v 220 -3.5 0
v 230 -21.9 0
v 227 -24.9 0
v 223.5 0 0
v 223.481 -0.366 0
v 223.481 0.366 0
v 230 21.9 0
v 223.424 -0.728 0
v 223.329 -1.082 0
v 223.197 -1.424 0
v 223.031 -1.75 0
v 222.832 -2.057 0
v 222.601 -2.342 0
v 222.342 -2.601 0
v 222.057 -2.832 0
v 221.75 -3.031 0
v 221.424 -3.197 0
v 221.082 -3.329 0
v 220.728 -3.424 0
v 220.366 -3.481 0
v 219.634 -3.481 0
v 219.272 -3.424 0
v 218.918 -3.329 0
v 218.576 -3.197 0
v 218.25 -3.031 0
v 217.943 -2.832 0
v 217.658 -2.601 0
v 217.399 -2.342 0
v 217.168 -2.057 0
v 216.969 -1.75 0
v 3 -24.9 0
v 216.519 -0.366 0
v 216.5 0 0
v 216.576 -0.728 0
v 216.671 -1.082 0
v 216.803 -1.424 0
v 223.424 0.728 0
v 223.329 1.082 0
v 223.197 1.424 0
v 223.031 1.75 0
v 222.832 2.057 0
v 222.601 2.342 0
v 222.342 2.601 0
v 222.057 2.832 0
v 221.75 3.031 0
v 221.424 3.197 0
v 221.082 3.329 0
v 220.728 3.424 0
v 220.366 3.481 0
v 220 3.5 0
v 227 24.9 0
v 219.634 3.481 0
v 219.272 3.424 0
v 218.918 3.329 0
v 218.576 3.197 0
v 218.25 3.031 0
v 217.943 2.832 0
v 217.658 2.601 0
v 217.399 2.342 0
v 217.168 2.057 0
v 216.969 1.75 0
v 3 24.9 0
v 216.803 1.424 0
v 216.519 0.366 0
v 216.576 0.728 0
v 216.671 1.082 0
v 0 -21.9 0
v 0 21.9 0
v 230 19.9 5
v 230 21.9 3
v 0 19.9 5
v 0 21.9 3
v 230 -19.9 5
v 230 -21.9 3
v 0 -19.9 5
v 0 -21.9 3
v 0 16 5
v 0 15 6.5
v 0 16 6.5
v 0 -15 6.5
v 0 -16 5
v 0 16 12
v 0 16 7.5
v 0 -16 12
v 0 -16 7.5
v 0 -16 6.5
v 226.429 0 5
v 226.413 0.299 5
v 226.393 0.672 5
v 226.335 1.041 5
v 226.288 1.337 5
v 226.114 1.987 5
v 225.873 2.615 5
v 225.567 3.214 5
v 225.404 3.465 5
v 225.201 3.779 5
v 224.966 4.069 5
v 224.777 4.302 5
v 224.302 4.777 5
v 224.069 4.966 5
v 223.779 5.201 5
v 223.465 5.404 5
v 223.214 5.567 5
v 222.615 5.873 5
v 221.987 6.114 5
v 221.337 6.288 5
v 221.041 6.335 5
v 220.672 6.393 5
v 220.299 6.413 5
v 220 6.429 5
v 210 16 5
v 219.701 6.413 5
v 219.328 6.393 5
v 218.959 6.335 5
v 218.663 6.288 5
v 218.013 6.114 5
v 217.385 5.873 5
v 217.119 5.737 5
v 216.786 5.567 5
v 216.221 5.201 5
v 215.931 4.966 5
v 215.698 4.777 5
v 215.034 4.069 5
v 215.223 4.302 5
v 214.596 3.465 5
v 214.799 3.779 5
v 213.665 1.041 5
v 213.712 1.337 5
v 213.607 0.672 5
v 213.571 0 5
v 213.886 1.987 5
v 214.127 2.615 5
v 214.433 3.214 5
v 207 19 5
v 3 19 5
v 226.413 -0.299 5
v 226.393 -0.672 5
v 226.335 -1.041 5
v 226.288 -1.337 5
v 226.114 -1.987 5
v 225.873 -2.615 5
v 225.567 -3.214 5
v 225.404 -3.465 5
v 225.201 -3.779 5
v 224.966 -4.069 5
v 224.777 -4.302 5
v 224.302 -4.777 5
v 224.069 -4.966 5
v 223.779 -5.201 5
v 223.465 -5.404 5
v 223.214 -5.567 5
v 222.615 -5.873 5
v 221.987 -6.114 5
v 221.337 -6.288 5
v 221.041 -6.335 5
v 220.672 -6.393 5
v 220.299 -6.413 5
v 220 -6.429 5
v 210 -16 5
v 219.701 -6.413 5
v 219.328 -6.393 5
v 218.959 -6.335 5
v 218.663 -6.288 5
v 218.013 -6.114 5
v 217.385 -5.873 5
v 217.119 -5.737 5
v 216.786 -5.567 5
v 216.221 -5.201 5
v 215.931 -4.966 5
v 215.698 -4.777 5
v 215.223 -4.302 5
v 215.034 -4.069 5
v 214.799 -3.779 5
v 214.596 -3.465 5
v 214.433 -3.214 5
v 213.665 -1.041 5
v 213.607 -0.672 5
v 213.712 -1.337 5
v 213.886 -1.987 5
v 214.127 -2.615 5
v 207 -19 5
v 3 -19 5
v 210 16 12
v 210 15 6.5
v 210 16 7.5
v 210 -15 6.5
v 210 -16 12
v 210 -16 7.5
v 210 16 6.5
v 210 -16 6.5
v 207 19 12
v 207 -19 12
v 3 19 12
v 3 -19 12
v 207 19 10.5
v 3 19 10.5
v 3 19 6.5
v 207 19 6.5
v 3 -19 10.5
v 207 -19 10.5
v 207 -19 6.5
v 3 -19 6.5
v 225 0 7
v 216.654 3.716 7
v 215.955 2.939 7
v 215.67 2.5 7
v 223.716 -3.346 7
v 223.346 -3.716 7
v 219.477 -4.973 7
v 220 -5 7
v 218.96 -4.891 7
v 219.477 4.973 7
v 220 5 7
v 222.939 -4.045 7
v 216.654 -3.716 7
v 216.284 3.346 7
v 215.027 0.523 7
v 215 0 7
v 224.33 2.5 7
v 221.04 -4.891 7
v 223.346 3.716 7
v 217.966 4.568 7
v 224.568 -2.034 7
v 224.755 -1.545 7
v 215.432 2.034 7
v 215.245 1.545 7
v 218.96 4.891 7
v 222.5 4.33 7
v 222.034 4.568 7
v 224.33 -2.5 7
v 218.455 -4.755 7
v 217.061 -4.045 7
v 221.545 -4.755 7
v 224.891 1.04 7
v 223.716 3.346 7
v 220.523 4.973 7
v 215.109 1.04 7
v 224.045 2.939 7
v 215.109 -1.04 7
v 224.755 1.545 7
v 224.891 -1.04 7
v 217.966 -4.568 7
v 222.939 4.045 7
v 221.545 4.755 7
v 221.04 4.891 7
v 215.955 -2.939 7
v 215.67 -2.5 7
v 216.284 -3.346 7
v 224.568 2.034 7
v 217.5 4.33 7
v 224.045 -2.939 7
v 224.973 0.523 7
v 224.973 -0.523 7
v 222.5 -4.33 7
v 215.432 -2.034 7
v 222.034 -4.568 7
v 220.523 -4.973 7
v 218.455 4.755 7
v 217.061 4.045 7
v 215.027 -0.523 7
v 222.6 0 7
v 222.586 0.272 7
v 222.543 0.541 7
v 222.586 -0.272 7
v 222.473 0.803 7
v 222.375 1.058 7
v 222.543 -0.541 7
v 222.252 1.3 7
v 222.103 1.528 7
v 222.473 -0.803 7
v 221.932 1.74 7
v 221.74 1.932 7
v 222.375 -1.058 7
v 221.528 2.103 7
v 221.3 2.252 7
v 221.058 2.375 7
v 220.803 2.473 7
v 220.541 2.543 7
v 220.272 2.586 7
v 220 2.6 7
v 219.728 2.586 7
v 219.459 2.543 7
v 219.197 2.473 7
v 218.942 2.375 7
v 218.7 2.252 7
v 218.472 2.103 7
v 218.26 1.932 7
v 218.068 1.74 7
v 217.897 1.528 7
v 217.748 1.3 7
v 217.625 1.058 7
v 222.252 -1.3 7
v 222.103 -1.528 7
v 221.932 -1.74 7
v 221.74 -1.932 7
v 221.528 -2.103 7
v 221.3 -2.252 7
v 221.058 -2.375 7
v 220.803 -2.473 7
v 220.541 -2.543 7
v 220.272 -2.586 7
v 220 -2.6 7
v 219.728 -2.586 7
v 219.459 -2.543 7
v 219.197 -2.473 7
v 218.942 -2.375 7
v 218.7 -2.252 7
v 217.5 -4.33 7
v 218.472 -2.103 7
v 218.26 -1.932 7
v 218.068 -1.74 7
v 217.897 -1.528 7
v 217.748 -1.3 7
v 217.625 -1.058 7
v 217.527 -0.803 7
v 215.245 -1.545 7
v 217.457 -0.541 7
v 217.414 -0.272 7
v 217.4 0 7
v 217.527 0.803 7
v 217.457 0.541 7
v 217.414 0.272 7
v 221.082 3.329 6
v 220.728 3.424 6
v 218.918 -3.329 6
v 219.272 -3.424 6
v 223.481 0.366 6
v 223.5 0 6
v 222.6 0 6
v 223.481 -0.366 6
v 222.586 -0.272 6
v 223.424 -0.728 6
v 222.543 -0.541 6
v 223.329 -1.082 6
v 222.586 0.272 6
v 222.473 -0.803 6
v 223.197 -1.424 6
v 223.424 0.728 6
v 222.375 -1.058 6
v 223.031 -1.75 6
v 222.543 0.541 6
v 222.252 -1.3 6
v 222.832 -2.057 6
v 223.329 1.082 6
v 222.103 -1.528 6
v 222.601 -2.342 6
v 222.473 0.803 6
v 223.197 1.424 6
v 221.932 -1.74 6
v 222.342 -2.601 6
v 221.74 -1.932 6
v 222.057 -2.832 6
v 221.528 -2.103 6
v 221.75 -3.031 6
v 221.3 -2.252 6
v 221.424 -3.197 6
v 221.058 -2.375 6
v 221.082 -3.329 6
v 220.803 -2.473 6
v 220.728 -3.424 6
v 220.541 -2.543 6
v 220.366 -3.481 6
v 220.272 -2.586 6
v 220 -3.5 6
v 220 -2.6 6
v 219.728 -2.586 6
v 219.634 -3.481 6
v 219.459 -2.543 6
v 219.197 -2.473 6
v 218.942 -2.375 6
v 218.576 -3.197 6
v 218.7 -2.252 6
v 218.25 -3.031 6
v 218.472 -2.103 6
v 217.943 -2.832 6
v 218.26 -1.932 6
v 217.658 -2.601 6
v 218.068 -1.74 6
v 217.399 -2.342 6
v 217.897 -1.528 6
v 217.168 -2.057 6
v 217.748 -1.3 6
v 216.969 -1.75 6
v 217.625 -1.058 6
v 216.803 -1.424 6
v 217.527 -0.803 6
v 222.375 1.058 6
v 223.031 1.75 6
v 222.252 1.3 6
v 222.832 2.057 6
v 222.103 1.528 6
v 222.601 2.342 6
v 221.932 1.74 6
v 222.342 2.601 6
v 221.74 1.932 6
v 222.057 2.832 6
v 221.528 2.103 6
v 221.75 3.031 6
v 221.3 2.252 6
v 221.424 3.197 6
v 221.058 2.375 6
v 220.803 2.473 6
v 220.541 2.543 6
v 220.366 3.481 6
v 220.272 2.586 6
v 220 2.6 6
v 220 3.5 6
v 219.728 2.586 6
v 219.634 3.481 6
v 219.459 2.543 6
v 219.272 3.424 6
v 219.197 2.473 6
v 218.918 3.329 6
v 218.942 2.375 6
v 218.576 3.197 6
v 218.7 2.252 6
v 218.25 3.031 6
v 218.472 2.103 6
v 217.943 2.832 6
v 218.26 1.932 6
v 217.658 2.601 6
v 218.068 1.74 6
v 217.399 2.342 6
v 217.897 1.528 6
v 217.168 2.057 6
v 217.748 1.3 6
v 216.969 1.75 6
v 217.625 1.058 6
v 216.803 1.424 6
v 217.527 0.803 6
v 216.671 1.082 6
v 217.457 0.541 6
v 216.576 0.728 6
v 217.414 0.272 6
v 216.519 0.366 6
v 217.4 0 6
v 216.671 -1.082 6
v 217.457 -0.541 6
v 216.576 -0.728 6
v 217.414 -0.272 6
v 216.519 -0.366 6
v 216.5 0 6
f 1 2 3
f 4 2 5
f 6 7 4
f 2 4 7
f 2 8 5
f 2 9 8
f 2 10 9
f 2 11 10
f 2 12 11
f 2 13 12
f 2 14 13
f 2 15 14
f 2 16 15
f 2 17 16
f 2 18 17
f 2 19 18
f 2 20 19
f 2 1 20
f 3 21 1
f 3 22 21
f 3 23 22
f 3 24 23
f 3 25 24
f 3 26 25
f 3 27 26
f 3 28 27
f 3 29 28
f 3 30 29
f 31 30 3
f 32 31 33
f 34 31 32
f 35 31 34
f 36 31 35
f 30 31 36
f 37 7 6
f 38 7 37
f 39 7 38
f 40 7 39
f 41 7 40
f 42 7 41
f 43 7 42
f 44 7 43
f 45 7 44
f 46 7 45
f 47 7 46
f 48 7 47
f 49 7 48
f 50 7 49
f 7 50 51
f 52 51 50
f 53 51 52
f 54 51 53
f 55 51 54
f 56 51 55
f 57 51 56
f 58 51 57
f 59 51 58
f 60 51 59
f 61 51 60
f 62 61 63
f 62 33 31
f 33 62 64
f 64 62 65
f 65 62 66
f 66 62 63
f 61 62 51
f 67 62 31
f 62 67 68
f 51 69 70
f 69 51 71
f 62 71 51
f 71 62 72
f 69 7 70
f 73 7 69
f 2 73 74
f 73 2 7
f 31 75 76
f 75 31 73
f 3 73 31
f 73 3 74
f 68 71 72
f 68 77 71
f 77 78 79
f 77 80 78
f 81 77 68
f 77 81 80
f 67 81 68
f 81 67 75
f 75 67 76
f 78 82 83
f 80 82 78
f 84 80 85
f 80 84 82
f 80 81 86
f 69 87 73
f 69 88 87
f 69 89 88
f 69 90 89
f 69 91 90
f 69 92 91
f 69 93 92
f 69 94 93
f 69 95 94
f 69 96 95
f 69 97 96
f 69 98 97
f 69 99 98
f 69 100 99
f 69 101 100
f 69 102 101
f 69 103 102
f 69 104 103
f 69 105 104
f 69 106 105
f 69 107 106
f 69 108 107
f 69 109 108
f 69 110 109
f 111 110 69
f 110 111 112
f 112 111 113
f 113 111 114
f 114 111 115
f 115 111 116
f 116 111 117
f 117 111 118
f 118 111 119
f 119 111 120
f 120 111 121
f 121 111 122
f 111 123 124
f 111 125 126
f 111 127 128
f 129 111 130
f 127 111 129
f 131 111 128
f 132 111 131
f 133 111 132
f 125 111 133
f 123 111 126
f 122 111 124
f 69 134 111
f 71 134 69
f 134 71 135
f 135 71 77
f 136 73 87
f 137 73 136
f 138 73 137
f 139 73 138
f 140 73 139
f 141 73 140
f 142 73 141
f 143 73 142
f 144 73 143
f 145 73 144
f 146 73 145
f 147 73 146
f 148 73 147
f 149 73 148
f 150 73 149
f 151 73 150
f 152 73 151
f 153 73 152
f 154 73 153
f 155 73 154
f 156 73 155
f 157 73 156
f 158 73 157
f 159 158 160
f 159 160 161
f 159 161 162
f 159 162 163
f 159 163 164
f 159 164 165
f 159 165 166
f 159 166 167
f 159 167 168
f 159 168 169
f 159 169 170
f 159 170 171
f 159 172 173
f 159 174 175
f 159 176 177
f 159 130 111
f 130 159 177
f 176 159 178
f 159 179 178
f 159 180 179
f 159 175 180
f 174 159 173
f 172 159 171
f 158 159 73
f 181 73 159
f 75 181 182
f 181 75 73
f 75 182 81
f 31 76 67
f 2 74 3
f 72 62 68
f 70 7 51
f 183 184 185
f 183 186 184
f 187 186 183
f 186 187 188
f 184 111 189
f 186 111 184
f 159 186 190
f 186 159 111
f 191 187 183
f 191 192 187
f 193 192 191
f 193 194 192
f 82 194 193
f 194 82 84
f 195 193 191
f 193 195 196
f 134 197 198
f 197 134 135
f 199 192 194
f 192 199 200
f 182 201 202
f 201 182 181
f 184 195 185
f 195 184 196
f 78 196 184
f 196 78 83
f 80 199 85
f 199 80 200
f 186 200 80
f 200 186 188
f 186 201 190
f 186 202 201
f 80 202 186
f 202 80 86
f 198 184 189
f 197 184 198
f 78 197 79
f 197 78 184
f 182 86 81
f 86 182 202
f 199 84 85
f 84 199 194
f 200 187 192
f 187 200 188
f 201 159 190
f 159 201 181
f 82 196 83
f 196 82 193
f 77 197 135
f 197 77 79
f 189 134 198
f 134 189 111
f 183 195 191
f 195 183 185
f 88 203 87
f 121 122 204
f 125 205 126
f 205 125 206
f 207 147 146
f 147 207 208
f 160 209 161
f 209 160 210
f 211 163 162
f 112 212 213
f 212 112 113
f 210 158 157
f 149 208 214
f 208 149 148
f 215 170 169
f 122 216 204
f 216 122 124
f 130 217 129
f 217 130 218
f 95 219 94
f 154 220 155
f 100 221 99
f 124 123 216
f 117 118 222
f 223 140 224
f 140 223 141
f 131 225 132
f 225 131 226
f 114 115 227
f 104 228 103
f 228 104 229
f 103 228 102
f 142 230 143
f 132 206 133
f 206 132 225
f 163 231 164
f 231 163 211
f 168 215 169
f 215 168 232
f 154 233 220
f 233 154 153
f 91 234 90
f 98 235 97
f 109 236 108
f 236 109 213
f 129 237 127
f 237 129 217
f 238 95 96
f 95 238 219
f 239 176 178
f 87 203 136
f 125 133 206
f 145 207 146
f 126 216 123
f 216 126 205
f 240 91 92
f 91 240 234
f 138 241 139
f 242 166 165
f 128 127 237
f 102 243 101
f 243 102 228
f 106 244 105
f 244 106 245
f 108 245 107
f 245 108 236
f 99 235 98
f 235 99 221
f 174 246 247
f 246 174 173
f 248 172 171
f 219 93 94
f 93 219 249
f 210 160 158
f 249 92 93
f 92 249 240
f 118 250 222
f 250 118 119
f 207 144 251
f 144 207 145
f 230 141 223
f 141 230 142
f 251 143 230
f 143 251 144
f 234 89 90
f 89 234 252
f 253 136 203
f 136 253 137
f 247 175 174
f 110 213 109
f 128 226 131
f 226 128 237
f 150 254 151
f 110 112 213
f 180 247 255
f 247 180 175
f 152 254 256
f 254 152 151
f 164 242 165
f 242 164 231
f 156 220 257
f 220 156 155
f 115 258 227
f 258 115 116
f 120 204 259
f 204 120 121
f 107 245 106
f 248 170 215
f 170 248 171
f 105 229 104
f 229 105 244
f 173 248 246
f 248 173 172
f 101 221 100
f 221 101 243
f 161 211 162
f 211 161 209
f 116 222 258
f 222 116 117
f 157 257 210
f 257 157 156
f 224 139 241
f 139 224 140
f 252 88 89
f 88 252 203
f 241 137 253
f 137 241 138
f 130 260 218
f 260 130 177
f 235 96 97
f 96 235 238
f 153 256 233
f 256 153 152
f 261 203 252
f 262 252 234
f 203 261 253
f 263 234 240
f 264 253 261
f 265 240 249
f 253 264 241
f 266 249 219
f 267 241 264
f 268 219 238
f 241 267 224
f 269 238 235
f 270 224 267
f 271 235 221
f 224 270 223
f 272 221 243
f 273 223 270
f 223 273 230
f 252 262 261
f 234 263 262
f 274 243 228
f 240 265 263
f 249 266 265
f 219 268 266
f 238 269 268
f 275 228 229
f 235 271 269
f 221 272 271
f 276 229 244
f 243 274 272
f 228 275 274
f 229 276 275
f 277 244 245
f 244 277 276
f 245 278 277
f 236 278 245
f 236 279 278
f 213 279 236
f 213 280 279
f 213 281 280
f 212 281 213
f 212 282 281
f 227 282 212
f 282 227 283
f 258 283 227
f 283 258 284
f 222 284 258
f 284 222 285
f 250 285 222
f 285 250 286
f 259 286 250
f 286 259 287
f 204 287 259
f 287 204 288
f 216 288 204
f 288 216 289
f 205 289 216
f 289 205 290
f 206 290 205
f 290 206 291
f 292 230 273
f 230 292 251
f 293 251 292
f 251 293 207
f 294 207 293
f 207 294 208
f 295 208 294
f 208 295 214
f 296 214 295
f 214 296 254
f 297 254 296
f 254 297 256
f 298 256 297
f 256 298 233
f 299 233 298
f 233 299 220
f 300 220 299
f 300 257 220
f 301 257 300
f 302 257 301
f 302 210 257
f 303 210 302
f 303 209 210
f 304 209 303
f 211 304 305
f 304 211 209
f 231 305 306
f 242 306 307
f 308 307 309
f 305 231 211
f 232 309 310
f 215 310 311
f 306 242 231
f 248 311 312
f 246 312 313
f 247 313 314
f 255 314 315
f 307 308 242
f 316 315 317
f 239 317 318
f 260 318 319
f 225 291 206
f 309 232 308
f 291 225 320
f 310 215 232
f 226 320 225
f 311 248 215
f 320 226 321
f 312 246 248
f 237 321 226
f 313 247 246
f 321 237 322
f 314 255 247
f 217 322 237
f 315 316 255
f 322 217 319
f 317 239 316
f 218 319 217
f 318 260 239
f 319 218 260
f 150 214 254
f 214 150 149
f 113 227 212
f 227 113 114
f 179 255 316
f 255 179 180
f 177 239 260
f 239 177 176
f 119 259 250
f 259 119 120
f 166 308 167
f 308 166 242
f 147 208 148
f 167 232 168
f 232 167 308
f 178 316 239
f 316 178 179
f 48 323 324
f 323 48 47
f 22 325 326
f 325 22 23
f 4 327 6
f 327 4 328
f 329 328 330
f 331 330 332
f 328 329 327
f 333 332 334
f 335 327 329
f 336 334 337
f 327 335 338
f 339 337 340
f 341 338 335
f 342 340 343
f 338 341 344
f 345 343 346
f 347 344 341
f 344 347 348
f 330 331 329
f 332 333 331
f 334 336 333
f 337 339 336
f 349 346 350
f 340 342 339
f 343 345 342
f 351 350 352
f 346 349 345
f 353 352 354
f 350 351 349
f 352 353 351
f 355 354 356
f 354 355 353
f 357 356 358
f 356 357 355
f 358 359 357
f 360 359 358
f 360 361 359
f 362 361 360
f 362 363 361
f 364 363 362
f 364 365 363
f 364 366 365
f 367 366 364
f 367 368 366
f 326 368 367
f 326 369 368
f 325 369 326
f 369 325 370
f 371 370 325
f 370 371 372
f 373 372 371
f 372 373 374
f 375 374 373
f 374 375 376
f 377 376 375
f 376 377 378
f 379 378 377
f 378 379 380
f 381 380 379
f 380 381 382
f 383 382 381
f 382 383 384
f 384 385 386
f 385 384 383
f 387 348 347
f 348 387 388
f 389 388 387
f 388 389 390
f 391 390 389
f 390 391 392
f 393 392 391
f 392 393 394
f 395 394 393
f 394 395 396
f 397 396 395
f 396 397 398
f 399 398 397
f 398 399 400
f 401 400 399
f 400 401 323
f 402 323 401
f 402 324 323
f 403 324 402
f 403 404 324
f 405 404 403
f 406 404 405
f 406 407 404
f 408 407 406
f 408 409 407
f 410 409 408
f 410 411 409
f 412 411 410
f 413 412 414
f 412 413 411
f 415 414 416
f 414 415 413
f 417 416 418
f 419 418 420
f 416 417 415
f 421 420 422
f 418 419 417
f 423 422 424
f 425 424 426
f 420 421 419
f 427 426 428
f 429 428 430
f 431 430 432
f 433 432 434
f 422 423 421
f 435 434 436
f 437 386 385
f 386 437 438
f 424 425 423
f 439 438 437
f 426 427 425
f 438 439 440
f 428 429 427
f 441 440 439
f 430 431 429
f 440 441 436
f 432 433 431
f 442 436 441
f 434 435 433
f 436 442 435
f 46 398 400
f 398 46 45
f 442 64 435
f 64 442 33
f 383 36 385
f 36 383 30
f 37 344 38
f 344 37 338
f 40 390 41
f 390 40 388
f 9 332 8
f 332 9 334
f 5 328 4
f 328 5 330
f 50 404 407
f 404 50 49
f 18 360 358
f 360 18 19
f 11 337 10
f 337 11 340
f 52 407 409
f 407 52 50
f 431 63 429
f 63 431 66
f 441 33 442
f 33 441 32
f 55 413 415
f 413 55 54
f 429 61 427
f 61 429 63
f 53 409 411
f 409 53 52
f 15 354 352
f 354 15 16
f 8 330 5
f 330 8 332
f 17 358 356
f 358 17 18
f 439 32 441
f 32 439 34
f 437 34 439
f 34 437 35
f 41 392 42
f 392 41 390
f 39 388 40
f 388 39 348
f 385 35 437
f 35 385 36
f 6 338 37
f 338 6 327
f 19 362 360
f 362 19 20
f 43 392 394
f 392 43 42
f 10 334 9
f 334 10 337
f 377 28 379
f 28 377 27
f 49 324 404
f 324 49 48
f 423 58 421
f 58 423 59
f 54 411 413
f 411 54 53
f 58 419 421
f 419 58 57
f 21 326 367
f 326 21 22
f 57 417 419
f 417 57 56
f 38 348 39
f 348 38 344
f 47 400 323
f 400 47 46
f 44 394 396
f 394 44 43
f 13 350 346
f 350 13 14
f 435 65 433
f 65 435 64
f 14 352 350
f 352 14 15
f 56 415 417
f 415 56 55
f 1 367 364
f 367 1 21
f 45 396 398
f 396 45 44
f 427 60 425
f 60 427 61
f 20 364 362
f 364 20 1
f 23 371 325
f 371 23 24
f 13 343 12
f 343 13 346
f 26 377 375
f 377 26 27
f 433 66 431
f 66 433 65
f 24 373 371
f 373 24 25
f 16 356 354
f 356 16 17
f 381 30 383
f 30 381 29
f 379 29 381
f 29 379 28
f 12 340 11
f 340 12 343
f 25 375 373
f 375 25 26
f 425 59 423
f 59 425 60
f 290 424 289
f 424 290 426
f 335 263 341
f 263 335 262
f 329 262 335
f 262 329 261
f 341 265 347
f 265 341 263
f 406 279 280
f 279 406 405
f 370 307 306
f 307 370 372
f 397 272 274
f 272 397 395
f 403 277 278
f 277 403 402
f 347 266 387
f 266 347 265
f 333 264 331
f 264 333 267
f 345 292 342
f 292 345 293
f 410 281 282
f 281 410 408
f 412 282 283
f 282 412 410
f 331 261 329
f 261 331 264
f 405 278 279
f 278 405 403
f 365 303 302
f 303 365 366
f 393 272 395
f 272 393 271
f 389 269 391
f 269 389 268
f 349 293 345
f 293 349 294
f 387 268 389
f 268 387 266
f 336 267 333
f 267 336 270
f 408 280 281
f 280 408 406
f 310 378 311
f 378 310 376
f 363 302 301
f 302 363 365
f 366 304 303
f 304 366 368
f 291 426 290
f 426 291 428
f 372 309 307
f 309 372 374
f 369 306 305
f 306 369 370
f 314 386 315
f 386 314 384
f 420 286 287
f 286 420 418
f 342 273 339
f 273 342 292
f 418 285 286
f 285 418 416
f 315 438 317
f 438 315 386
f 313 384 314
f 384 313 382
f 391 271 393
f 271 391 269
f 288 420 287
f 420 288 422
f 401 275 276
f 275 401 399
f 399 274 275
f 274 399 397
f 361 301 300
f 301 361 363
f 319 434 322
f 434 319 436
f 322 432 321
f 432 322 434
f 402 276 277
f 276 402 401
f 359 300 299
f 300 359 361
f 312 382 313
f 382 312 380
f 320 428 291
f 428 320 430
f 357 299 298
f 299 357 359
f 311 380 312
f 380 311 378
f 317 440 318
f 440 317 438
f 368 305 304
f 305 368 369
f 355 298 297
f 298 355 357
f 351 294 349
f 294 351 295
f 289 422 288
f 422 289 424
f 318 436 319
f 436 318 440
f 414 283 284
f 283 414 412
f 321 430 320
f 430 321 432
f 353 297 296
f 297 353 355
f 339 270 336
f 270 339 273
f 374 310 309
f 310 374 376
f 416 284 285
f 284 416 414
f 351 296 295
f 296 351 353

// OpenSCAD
// file: config_5x7.scad
/*
This is the base configuration file for the 4x5" format
# we are not using the exact ANSI measures, but slightly rounded measures for slight simplification
*/

// general tolerance
vTolerance = 0.2;

// sheet film and cassette measurements
vFilmSheet_l = 178;
vFilmSheet_w = 127;
vCassette_l = 214; // A min
vCassette_w = 150; // B max
vCassette_h = 14; // C max (14.3)
vLightTrap_l = 1.5; // M2
vLightTrap_w = vCassette_w;
vLightTrap_h = 1.5; // M1
vLightTrap_offsetX = 194.5; // G max
vFilmWindow_l = 171;
vFilmWindow_w = 126;
vFilmWindow_offsetX = 18;
vGroundGlass_offsetZ = 5.8;

// Graflok - although 5x7 normally doesn't have Graflok clamps, but we use this measurement on the back plate
vGraflok_h = 6; // this is not the official measurement, just measured from a camera 

// lens board measures (we are using Wista/Technika-style lensboards)
vLensboard_l = 100;
vLensboard_w = 97;
vLensboard_h = 2;
vLensboard_offsetX = -(vLensboard_l+3)/2; // caution: we have an asymetric offset!
vLensboard_offsetY = -vLensboard_w/2;
vLensboardHole_d = 85;
vLensboardLighttrap_d = 89;
vLensboardLighttrap_h = 1+vTolerance;

// bellows frame measures - the bellows frame design is derived from standardcameras.com
// back frame
vBellowsBackInner_l = 193;
vBellowsBackInner_w = vBellowsBackInner_l;
vBellowsBackOuter_l = vBellowsBackInner_l+1;
vBellowsBackOuter_w = vBellowsBackOuter_l;

vBellowsBackFrameOuter_l = 209;
vBellowsBackFrameOuter_w = vBellowsBackFrameOuter_l;
vBellowsBackFrameOuter_h = 7;
vBellowsBackFrameInner_l = 180;
vBellowsBackFrameInner_w = vBellowsBackFrameInner_l;
vBellowsBackFrameInner_h = 5;

vBellowsBackLightTrapOuter_l = vBellowsBackFrameInner_l+2*2;
vBellowsBackLightTrapOuter_w = vBellowsBackLightTrapOuter_l;
vBellowsBackLightTrap_h = 3;

vBellowsBackFrameScrewHole_d = 2;
vBellowsBackFrameScrewHole_h = 10;
vBellowsBackFrameScrewHole_offsetXY = 80;
vBellowsBackFrameScrewHole_offsetZ = vBellowsBackFrameOuter_h/2;

// front frame
vBellowsFrontInner_l = 110; 
vBellowsFrontInner_w = vBellowsFrontInner_l;
vBellowsFrontOuter_l = vBellowsFrontInner_l+1;
vBellowsFrontOuter_w = vBellowsFrontOuter_l;

vBellowsFrontFrameOuter_l = 124;
vBellowsFrontFrameOuter_w = vBellowsFrontFrameOuter_l;
vBellowsFrontFrameOuter_h = 7;
vBellowsFrontFrameInner_l = 98;
vBellowsFrontFrameInner_w = vBellowsFrontFrameInner_l;
vBellowsFrontFrameInner_h = 5;

vBellowsFrontLightTrapOuter_l = vBellowsFrontFrameInner_l+2*2;
vBellowsFrontLightTrapOuter_w = vBellowsFrontLightTrapOuter_l;
vBellowsFrontLightTrap_h = 0;

vBellowsFrontFrameScrewHole_d = 2;
vBellowsFrontFrameScrewHole_h = 10;
vBellowsFrontFrameScrewHole_offsetXY = 50;
vBellowsFrontFrameScrewHole_offsetZ = vBellowsFrontFrameOuter_h/2;




// body dimensions
vWall_strength = 5;
vBodyOuter_l = 230;
//vBodyOuter_l = 235; // make sure this is at least 4*vWall_strength larger than vBellowsBackFrameOuter_l!
vBodyOuter_w = 220; // make sure this is at least 2*vWall_strength larger than vBellowsBackFrameOuter_l!
vBodyOuter_h = 65;
vBodyEdge_r = vWall_strength;

// we will center our model on the Y axis and on the center of the bellows frame
// at least for the 4x5 version, we have to do an asymetric offset of 2.5mm on the X-axis 
vAsymOffsetX = 0;
//vAsymOffsetX = -2.5;  

// back plate
vBackPlateLength = 210; // we will probably use about the same size as the bellows back frame
vBackPlateStrength = vWall_strength;

// hinges for front lid
vHingeInnerDistance = 120;
vHingeBaseWidth = 30;
vHingeHole = 5;

// lid lock measures
vLidLockBase_d = 8;
vLidLockHole_distance = 100;

// rail dimensions
vLowerRail_w = 120;
vUpperRail_w = vLowerRail_w;

// cutout for stop indents
vStopIndent_l = 4;
vStopIndent_h = 5;
vStopIndentDistance = 30; // shorter than 25 is not necessary
vStopIndent_offsetX = 35; // don't go shorter than 20 if you intend to use a 90mm lens!

// for all dovetails we use a base width of 5mm and a base height of 5mm
// we are applying tolerances to the inner AND outer part of a dovetail, in width and height
vDoveTail_w = 5;
vDoveTail_h = 5;
vDoveTail_tolerance = 0.2;

// focusing rod
vFocusingRod_d = 6;
vFocusingKnob_d = 25;
vFocusingKnob_h = 20;

// stabilizer measures (just the outer measures of our stabilizer block, not the tripod slider)
vStabilizerBase_l = vBodyOuter_l;
vStabilizerBase_w = 100;  
vStabilizerBase_h = 2;
vStabilizerTotal_h = 7;
vStabilizerDovetailBase_w = 50;

// screw holes for the stabilizer
vLidHoleCount_x = 6;
vLidHoleDist_x = 35;
vLidHoleCount_y = 2;
vLidHoleDist_y = 60;

// screw diameters, length is individually set
vScrew1Hole_d = 3;
vScrew1ThreadHole_d = 2.2;
vScrew2Hole_d = 2;
vScrew2ThreadHole_d = 1.4;


 
// file: modules.scad
/*
This is a collection of the modules which are used heavily within the whole project.
Almost all parts rely on the modules to remain "as is", especially regarding their current orientation.
So please act very carefully here, otherwise you may screw up the complete design!

*/

// roof module - this is heavily used for dovetail cutouts
// please keep as is
module roof(l, w, h){
    polyhedron(
        points=[
            [0,0,0],
            [l,0,0],
            [l,w,0],
            [0,w,0],
            [0,w/2,h],
            [l,w/2,h]
            ],
        faces=[
            [0,1,2,3],
            [0,4,1],
            [1,4,5,2],
            [2,5,3],
            [3,5,4,0]
            ]
            );
    };

// a wedge module - this is heavily used for cutting edges
// please keep as is    
module wedge(l, w, h) {
    polyhedron(
            points=[
                [0,0,0],
                [l,0,0],
                [l,w,0],
                [0,w,0],
                [0,0,h],
                [l,0,h]
            ],
            faces=[
                [0,3,2,1],
                [0,1,5,4],
                [1,2,5],
                [2,3,4,5],
                [3,0,4]
            ]
    );
   };

// simple tube module.   
module tube(d1, d2, h) {
    difference() {
        cylinder(d=d1, h=h);
        cylinder(d=d2, h=h);
        };
    };

// mainly used for making holes for countersunk screws
// please keep as is    
module countersunk_screw(vScrew_d, vScrew_l){
    union(){
    cylinder(d=vScrew_d, h= vScrew_l);
    cylinder(d1=vScrew_d*2, h=vScrew_d);
    };
};

// module for making hexagons, e.g. hex nuts. kw is the key width
// please keep as is
module hex(kw, h) {
	render()
        translate([0, 0, h/2])
            intersection_for(a = [0, 120, 240]) {
                rotate([0, 0, a])
                    cube([kw, 3 * kw, h], true);
                }
}
// file: baseconfig.scad
/*
Here we define some variables which are independent from the camera format
*/


// some generic variables
$fn = 60; // we are using 60 fragments for cylinders and similar objects

// we are including a format specific configuration sheet - but make sure to include only one!

// include <config_4x5.scad>;
include <config_5x7.scad>;
// include <config_8x10.scad>;

// Arca Swiss tripod plate
// caution: some Arca Swiss compatible tripod heads may have slight variations
// vArca_length = xx; // the length is irrelevant here
vArca_width = 38;
vArca_height = 7;
vArcaBase_cutout = 4;
vArcaBase_height = 1.5;
// main file
// loading the base configuration
include <baseconfig.scad>;

// some modules such as hex, countersunk screws, roof, wedge are available in a module file
use <modules.scad>;


vTotalPlate_length = vStabilizerBase_l;
vTotalPlate_height = 12;

vDovetail_length = vTotalPlate_length;
vDovetailOuter_width = vStabilizerDovetailBase_w-vDoveTail_tolerance;
vDovetailInner_width = vDovetailOuter_width-(2*vDoveTail_w);
vDovetail_height = vDoveTail_h;
vDovetail_offsetX = 0;
vDovetail_offsetY = -vDovetailOuter_width/2;
vDovetail_offsetZ = 0;

vDovetailEdgeCutoff = 3;

vArca_length = vTotalPlate_length-20;
vArca_width = 38;
vArca_height = 7;
vArcaBase_cutout = 4;
vArcaBase_height = 1.5;
vArca_offsetX = 0;
vArca_offsetY = -vArca_width/2;
vArca_offsetZ = vDovetail_height+vArca_height;

vArcaEdgeCutoff = 3;


vLockingCylinder_d1 = 20;
vLockingCylinder_d2 = 10;
vLockingCylinder_h = 7;
vLockingCylinder_offsetX = vTotalPlate_length-10;
vLockingCylinder_offsetY = 0;
vLockingCylinder_offsetZ = 0;

// we are using a M5x6x7 thread nut!
vLockingThreadHole_d = 7;
vLockingThreadHole_h = 6;
vLockingThreadHole_offsetX = vLockingCylinder_offsetX;
vLockingThreadHole_offsetY = vLockingCylinder_offsetY;
vLockingThreadHole_offsetZ = vLockingCylinder_offsetZ;

vLockingHole_d = 5.2;
vLockingHole_h = vTotalPlate_height;
vLockingHole_offsetX = vLockingCylinder_offsetX;
vLockingHole_offsetY = vLockingCylinder_offsetY;
vLockingHole_offsetZ = vLockingCylinder_offsetZ;


difference(){
    union(){
        // Dovetail plate
        translate([vDovetail_offsetX, vDovetail_offsetY, vDovetail_offsetZ])
            difference(){
                intersection(){
                    roof(vDovetail_length, vDovetailOuter_width, vDovetailOuter_width/2);
                    cube([vDovetail_length, vDovetailOuter_width, vDovetail_height]);
                };
                // cut off dovetail edges
                translate([0, 0, 0])
                    rotate([0, 270, 0])
                        wedge(vDovetail_height, vDovetailEdgeCutoff, -vDovetailEdgeCutoff);
                translate([vDovetail_length, 0, 0])
                    rotate([0, 270, 0])
                        wedge(vDovetail_height, vDovetailEdgeCutoff, vDovetailEdgeCutoff);
                translate([0, vDovetailOuter_width, 0])
                    rotate([0, 270, 0])
                        wedge(vDovetail_height, -vDovetailEdgeCutoff, -vDovetailEdgeCutoff);
                translate([vDovetail_length, vDovetailOuter_width, 0])
                    rotate([0, 270, 0])
                        wedge(vDovetail_height, -vDovetailEdgeCutoff, vDovetailEdgeCutoff);
                
            };
        
        // Arca plate    
        translate([vArca_offsetX, vArca_offsetY, vArca_offsetZ])
            mirror([0,0,1])
                difference(){
                    union(){
                        cube([vArca_length, vArca_width, vArcaBase_height ]);
                        translate([0, 0, vArcaBase_height])
                            roof(vArca_length, vArca_width, vArca_width/2);
                        translate([0,0,vArcaBase_height+vArcaBase_cutout])
                            cube([vArca_length, vArca_width, vArca_width]);
                    };
                    translate([0,0,vArca_height])
                        cube([vArca_length, vArca_width, vArca_width]);
                    
                    // cut off edges
                    translate([0, 0, 0])
                        rotate([0, 270, 0])
                            wedge( vArca_height, vArcaEdgeCutoff, -vArcaEdgeCutoff);
                    
                    translate([vArca_length, 0, 0])
                        rotate([0, 270, 0])
                         wedge(vArca_height, vArcaEdgeCutoff, vArcaEdgeCutoff);
                    
                    translate([0, vArca_width, 0])
                        rotate([0, 270, 0])
                            wedge(vArca_height, -vArcaEdgeCutoff, -vArcaEdgeCutoff);
                    
                    translate([vArca_length, vArca_width, 0])
                        rotate([0, 270, 0])
                            wedge(vArca_height, -vArcaEdgeCutoff, vArcaEdgeCutoff);
                    
                };
        
        // Cylinder for locking mechanism
        translate([vLockingCylinder_offsetX, vLockingCylinder_offsetY, vLockingCylinder_offsetZ])
            cylinder(d1=vLockingCylinder_d1, d2=vLockingCylinder_d2, h=vLockingCylinder_h);
                
    };
    // Hole for thread nut
        translate([vLockingThreadHole_offsetX, vLockingThreadHole_offsetY, vLockingThreadHole_offsetZ])
            cylinder(d=vLockingThreadHole_d, h=vLockingThreadHole_h);
    
    // ScrewHole
        translate([vLockingHole_offsetX, vLockingHole_offsetY, vLockingHole_offsetZ])
            cylinder(d=vLockingHole_d, h=vLockingHole_h);
    
};
